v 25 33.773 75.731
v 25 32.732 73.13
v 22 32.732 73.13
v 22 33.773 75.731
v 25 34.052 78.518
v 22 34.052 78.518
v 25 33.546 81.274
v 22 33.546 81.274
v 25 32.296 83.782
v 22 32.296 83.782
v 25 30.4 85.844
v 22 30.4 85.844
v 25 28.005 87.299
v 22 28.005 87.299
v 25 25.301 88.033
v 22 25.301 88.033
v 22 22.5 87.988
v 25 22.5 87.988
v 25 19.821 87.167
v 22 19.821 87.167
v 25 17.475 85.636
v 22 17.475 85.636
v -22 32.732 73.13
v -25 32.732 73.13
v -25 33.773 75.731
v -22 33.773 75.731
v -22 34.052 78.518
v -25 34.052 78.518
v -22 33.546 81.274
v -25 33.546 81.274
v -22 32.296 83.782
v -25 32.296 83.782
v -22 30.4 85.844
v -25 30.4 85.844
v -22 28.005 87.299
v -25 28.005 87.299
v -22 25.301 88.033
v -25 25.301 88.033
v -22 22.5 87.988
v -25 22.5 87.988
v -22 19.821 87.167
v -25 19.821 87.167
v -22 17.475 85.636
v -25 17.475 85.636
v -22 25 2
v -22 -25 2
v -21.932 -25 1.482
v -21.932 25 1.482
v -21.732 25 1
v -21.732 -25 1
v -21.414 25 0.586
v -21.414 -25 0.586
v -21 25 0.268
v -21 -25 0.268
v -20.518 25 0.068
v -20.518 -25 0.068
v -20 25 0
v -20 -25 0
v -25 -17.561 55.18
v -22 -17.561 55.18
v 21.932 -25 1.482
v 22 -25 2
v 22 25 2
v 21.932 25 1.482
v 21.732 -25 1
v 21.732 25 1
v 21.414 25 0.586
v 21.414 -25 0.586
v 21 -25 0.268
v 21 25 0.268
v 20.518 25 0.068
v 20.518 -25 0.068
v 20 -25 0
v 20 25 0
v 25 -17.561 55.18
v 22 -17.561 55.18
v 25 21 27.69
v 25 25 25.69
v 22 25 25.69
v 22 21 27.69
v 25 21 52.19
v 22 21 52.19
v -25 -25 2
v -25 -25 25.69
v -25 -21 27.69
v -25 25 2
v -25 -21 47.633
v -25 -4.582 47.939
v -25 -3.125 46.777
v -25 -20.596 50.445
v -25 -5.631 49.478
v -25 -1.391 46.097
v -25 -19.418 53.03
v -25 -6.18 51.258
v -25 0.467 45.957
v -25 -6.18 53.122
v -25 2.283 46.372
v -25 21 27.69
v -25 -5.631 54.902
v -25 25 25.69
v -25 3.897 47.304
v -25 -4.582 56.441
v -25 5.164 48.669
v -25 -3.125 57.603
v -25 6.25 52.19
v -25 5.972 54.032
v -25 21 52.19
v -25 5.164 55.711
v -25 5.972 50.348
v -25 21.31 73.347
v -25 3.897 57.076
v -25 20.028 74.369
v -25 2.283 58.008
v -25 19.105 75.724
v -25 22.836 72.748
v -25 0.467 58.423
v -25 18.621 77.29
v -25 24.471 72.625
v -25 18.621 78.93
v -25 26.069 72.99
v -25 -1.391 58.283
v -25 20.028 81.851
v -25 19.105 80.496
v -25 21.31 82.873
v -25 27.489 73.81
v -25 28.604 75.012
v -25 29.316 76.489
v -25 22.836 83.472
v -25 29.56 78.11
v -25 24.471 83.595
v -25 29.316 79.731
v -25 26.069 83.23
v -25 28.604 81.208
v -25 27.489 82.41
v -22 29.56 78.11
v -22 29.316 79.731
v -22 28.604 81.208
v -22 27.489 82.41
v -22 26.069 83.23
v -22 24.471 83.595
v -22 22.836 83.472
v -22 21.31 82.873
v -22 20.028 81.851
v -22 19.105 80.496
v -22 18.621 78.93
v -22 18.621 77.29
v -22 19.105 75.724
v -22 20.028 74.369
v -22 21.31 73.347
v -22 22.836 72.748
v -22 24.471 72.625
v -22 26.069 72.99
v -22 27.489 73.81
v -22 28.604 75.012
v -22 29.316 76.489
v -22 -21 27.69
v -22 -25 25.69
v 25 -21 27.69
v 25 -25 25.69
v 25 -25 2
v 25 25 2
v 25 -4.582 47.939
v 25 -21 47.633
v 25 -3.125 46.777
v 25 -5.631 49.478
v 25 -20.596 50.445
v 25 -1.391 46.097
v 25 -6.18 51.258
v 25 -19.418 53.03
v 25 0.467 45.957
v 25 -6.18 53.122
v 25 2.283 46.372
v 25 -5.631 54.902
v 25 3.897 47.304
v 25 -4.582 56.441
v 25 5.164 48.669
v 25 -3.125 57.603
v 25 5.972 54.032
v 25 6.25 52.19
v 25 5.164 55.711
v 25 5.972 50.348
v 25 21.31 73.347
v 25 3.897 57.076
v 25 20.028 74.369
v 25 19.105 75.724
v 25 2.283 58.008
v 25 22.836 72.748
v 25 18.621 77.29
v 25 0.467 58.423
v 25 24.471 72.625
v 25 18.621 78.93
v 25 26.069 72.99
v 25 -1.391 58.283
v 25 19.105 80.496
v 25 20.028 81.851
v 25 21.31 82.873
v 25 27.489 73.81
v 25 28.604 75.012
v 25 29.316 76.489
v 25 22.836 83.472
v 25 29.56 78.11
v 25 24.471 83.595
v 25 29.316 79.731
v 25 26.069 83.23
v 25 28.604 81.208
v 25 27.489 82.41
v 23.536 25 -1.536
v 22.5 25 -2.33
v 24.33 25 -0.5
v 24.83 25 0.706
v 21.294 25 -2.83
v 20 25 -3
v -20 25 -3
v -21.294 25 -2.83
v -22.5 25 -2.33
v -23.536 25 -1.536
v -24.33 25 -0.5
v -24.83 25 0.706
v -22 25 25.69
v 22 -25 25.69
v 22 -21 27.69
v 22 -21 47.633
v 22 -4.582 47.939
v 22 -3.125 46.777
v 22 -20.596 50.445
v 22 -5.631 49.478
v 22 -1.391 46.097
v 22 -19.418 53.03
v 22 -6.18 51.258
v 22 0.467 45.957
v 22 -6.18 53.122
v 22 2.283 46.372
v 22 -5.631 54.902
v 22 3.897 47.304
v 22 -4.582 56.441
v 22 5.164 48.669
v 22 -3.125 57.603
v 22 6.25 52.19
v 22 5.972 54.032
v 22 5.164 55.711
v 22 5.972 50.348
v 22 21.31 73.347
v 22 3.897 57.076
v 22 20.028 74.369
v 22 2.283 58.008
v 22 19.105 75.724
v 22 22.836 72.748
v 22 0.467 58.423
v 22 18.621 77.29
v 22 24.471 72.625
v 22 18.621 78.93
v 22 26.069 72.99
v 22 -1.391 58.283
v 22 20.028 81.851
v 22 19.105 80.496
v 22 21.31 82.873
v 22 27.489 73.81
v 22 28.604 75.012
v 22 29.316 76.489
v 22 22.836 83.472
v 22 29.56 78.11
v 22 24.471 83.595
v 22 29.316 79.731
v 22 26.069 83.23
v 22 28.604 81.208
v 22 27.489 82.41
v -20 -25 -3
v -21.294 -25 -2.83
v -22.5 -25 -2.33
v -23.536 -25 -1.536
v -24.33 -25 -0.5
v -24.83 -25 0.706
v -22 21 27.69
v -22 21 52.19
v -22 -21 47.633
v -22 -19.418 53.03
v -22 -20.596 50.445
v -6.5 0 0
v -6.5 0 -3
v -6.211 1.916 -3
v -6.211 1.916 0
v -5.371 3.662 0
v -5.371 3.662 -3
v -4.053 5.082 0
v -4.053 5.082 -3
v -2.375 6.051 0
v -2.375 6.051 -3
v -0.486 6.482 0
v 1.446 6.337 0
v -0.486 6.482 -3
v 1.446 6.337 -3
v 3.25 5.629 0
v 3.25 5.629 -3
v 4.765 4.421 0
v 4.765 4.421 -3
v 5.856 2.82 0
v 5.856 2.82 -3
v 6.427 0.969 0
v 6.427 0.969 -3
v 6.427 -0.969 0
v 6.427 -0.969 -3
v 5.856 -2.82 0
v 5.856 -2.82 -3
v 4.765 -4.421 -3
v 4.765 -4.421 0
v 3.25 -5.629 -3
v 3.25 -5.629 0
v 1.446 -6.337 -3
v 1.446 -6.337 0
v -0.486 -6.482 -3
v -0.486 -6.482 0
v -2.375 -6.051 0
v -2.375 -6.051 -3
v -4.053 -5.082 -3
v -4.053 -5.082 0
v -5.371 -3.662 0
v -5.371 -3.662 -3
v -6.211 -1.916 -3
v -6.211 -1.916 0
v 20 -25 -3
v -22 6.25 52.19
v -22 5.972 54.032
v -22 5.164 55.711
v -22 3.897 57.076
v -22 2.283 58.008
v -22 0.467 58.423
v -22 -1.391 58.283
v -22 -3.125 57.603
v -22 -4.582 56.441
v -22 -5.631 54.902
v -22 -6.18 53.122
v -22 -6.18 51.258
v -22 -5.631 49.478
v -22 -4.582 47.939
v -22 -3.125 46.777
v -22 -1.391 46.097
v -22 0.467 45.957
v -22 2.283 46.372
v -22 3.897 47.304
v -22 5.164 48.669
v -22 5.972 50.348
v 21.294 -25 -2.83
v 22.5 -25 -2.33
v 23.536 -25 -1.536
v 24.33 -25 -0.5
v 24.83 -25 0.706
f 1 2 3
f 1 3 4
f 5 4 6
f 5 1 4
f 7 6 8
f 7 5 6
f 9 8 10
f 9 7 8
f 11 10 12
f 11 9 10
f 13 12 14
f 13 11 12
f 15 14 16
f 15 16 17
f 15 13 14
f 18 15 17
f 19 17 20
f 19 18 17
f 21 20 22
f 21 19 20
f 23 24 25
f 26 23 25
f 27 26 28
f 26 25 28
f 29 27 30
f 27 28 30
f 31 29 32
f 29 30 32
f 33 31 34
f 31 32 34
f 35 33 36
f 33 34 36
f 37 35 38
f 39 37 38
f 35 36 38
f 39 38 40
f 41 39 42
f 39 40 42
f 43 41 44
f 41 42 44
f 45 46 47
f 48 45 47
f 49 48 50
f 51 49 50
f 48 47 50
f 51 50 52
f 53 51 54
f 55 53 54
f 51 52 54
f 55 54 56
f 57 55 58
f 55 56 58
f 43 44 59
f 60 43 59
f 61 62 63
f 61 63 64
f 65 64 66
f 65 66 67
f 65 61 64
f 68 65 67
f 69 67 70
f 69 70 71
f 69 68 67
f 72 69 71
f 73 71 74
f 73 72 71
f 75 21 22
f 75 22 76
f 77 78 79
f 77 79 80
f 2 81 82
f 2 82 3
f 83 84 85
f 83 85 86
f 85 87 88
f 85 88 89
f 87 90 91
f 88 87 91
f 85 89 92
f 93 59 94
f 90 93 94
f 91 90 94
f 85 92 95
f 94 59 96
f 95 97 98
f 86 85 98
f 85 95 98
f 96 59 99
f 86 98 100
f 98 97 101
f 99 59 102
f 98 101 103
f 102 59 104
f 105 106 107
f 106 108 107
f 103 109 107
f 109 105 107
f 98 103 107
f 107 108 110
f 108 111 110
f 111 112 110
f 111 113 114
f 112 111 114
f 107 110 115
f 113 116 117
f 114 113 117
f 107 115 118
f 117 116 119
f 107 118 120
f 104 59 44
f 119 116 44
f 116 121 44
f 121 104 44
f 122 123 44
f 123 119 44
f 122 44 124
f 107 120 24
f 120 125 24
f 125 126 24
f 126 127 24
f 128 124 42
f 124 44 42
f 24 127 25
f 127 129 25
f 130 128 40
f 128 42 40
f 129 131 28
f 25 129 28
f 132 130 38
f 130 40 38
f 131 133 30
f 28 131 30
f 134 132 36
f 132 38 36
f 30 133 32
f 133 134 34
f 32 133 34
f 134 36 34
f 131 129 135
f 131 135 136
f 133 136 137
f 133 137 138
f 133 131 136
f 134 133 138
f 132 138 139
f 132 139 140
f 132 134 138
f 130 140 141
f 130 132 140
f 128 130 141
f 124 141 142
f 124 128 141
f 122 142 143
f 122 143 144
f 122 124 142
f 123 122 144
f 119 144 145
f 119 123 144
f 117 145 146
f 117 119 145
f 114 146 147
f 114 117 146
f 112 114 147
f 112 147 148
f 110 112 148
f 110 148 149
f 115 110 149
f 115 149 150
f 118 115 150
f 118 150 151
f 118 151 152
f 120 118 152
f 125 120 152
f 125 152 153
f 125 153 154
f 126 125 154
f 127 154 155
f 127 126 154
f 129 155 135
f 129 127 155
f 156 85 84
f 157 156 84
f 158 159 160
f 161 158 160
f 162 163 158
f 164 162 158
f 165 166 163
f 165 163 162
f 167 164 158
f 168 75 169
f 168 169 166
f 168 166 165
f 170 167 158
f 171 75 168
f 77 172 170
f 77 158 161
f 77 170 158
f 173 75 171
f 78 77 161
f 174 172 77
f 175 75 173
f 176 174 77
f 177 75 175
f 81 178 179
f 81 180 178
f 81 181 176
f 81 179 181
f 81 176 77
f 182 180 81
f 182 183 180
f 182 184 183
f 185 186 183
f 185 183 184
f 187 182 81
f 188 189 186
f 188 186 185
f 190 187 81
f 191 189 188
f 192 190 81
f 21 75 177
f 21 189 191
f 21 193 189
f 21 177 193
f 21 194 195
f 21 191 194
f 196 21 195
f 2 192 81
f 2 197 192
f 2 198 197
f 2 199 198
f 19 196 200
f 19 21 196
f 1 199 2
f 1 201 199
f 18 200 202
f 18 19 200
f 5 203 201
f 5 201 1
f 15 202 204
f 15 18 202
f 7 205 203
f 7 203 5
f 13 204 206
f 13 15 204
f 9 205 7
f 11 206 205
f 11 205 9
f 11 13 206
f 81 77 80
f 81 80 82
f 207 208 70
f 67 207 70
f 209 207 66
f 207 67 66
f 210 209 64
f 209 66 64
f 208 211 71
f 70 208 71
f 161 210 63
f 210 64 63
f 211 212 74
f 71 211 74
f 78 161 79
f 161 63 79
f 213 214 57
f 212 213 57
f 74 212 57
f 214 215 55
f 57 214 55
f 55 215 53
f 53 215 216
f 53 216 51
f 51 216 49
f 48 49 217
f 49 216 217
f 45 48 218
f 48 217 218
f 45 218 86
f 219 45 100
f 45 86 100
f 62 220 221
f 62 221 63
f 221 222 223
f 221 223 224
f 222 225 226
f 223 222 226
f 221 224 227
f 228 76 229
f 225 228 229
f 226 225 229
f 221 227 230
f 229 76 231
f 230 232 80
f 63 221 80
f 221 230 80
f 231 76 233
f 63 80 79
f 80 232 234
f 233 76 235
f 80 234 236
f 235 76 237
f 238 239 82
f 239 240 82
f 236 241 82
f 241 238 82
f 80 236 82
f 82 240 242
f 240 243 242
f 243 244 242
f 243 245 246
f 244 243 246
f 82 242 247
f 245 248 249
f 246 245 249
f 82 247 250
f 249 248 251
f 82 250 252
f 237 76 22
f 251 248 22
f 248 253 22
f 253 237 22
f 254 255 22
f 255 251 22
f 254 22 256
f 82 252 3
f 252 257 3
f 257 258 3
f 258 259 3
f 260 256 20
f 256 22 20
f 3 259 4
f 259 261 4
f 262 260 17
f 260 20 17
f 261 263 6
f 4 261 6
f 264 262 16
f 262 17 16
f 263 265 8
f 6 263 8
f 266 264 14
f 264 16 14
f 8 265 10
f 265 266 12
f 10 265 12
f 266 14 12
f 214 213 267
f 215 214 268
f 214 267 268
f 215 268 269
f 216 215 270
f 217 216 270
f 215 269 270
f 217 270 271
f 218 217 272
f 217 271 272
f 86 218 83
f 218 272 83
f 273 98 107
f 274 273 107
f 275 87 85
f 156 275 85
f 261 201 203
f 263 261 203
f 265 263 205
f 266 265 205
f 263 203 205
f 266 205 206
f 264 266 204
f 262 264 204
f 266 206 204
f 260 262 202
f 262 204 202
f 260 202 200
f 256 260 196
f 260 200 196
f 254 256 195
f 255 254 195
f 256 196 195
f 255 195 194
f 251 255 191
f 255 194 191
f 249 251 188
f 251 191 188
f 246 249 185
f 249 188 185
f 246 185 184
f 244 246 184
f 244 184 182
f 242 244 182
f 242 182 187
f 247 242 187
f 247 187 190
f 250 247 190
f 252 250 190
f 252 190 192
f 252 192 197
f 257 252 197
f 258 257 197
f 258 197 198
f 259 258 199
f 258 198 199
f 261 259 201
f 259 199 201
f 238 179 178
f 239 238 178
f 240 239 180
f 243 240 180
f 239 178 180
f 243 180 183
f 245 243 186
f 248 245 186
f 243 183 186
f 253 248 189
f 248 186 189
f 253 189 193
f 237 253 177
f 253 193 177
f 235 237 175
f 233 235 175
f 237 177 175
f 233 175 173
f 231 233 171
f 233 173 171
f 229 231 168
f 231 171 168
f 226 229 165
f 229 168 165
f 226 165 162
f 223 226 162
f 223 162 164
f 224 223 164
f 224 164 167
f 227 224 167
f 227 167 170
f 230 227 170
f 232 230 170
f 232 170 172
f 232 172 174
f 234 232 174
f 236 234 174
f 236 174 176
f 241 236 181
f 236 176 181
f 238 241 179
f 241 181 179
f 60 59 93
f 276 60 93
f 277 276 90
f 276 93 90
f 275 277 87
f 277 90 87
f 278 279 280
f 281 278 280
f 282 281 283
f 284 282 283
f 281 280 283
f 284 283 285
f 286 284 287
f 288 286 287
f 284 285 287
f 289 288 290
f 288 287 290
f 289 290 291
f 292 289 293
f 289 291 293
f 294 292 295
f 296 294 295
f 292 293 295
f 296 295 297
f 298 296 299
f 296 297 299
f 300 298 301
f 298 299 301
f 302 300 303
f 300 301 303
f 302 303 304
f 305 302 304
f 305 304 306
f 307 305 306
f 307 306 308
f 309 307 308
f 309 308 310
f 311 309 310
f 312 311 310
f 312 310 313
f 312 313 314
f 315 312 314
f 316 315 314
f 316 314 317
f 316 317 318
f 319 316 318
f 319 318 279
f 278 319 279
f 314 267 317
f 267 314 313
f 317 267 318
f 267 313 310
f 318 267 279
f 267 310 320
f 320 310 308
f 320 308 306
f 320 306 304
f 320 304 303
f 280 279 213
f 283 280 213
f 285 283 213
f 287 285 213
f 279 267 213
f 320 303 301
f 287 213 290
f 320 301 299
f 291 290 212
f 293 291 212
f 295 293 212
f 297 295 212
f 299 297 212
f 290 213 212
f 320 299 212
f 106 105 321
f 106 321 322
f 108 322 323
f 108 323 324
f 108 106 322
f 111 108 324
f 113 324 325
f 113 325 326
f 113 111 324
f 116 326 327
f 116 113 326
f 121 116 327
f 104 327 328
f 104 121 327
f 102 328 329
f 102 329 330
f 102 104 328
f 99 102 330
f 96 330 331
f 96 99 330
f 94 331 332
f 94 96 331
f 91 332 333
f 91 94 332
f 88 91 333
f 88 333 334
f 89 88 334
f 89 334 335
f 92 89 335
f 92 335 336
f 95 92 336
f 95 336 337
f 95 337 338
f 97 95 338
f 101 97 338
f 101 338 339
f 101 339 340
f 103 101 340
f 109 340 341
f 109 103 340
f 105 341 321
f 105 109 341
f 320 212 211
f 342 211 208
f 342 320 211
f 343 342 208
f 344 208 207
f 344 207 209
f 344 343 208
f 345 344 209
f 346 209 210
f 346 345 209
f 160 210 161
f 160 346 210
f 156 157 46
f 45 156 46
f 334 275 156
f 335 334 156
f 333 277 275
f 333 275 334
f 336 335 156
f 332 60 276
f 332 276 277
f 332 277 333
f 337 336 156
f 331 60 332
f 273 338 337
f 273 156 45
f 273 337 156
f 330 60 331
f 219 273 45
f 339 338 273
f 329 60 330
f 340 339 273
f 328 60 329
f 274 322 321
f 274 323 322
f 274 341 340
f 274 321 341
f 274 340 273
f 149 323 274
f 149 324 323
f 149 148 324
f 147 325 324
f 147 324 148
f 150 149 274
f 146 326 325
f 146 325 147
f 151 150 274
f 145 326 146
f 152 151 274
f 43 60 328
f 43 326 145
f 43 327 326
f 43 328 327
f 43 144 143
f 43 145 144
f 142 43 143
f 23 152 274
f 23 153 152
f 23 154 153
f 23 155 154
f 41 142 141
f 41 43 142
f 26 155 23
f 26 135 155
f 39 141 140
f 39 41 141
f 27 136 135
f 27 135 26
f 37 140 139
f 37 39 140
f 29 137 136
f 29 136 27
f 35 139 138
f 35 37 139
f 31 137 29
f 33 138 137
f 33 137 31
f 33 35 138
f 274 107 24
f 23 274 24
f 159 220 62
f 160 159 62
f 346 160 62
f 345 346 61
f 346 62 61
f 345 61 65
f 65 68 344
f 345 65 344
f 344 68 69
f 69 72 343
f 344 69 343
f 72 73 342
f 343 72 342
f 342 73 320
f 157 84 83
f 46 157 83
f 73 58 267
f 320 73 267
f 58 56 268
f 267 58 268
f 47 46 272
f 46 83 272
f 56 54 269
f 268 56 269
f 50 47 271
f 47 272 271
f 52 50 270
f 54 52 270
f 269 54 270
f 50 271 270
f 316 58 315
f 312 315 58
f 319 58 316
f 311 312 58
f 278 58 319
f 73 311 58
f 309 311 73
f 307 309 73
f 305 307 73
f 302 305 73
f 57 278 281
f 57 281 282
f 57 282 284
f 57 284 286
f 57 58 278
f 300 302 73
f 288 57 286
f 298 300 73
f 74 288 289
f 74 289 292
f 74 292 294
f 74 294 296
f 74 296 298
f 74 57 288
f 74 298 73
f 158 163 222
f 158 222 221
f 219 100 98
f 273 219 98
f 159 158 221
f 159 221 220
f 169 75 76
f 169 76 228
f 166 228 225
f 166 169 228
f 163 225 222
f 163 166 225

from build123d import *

# Parameters (mm, degrees)
SKETCH1_W                    = 50
SKETCH1_H                    = 50
BASE_FLANGE2_DEPTH           = 3
EDGE_FLANGE1_STRIP_W         = 16
EDGE_FLANGE1_STRIP_H         = 3
EDGE_FLANGE1_STRIP_CUT_DEPTH = 50
EDGE_FLANGE1_DEPTH           = 50
EDGE_FLANGE1_PROFILE_R       = 6.25
EDGE_FLANGE1_PROFILE_R_2     = 5.5
EDGE_FLANGE1_FLAT_DEPTH      = 3
SKETCH22_R                   = 6.5
CUT_EXTRUDE1_DEPTH           = 10


# Sheet-metal steps are written as plain solids
with BuildPart() as part:
    # Sketch1 → Base-Flange2 (new body)
    with BuildSketch(Plane.XY):
        Rectangle(SKETCH1_W, SKETCH1_H)
    extrude(amount=-BASE_FLANGE2_DEPTH)

    # Edge-Flange1 strip (across the edge) → Edge-Flange1 strip cut (cut)
    with BuildSketch(Plane(origin=(25, -25, 0), x_dir=(-1, 0, 0), z_dir=(0, 1, 0))):
        with Locations((-3, -1.5)):
            Rectangle(EDGE_FLANGE1_STRIP_W, EDGE_FLANGE1_STRIP_H)
    edge_flange1_strip_cut = extrude(amount=EDGE_FLANGE1_STRIP_CUT_DEPTH, mode=Mode.SUBTRACT)

    # Edge-Flange1 bend section (across the edge) → Edge-Flange1 (add)
    with BuildSketch(Plane(origin=(25, -25, 0), x_dir=(-1, 0, 0), z_dir=(0, 1, 0))):
        with BuildLine():
            Line((0, 2), (3, 2))
            ThreePointArc((3, 2), (3.585786438, 0.585786438), (5, 0))
            Line((5, 0), (5, -3))
            ThreePointArc((5, -3), (1.464466094, -1.535533906), (0, 2))
        make_face()
    edge_flange1 = extrude(amount=EDGE_FLANGE1_DEPTH)

    # Edge-Flange1 profile (on flange) → Edge-Flange1 flat (add)
    with BuildSketch(Plane.YZ.offset(25)):
        with BuildLine():
            ThreePointArc((32.731549172, 73.12961498), (30.399526878, 85.843718314), (17.474995057, 85.635802941))
            Line((17.474995057, 85.635802941), (-17.56059029, 55.179833247))
            ThreePointArc((-17.56059029, 55.179833247), (-20.099612709, 51.779669871), (-21, 47.632737445))
            Line((-21, 47.632737445), (-21, 27.69))
            Line((-21, 27.69), (-25, 25.69))
            Line((-25, 25.69), (-25, 2))
            Line((-25, 2), (25, 2))
            Line((25, 2), (25, 25.69))
            Line((25, 25.69), (21, 27.69))
            Line((21, 27.69), (21, 52.19))
            Line((21, 52.19), (32.731549172, 73.12961498))
        make_face()
        with Locations((0, 52.19)):
            Circle(EDGE_FLANGE1_PROFILE_R, mode=Mode.SUBTRACT)
        with Locations((24.06, 78.11)):
            Circle(EDGE_FLANGE1_PROFILE_R_2, mode=Mode.SUBTRACT)
    edge_flange1_flat = extrude(amount=-EDGE_FLANGE1_FLAT_DEPTH)

    # Mirror1: Edge-Flange1 strip cut, Edge-Flange1, Edge-Flange1 flat across plane
    add(edge_flange1_strip_cut.mirror(Plane(origin=(0, 0, 0), x_dir=(0, 0, 1), z_dir=(1, 0, 0))), mode=Mode.SUBTRACT)
    add(edge_flange1.mirror(Plane(origin=(0, 0, 0), x_dir=(0, 0, 1), z_dir=(1, 0, 0))))
    add(edge_flange1_flat.mirror(Plane(origin=(0, 0, 0), x_dir=(0, 0, 1), z_dir=(1, 0, 0))))

    # Sketch22 → Cut-Extrude1 (cut)
    with BuildSketch(Plane(origin=(0, 0, -3), x_dir=(-1, 0, 0), z_dir=(0, 0, -1))):
        Circle(SKETCH22_R)
    extrude(amount=-CUT_EXTRUDE1_DEPTH, mode=Mode.SUBTRACT)


solid = part.part
